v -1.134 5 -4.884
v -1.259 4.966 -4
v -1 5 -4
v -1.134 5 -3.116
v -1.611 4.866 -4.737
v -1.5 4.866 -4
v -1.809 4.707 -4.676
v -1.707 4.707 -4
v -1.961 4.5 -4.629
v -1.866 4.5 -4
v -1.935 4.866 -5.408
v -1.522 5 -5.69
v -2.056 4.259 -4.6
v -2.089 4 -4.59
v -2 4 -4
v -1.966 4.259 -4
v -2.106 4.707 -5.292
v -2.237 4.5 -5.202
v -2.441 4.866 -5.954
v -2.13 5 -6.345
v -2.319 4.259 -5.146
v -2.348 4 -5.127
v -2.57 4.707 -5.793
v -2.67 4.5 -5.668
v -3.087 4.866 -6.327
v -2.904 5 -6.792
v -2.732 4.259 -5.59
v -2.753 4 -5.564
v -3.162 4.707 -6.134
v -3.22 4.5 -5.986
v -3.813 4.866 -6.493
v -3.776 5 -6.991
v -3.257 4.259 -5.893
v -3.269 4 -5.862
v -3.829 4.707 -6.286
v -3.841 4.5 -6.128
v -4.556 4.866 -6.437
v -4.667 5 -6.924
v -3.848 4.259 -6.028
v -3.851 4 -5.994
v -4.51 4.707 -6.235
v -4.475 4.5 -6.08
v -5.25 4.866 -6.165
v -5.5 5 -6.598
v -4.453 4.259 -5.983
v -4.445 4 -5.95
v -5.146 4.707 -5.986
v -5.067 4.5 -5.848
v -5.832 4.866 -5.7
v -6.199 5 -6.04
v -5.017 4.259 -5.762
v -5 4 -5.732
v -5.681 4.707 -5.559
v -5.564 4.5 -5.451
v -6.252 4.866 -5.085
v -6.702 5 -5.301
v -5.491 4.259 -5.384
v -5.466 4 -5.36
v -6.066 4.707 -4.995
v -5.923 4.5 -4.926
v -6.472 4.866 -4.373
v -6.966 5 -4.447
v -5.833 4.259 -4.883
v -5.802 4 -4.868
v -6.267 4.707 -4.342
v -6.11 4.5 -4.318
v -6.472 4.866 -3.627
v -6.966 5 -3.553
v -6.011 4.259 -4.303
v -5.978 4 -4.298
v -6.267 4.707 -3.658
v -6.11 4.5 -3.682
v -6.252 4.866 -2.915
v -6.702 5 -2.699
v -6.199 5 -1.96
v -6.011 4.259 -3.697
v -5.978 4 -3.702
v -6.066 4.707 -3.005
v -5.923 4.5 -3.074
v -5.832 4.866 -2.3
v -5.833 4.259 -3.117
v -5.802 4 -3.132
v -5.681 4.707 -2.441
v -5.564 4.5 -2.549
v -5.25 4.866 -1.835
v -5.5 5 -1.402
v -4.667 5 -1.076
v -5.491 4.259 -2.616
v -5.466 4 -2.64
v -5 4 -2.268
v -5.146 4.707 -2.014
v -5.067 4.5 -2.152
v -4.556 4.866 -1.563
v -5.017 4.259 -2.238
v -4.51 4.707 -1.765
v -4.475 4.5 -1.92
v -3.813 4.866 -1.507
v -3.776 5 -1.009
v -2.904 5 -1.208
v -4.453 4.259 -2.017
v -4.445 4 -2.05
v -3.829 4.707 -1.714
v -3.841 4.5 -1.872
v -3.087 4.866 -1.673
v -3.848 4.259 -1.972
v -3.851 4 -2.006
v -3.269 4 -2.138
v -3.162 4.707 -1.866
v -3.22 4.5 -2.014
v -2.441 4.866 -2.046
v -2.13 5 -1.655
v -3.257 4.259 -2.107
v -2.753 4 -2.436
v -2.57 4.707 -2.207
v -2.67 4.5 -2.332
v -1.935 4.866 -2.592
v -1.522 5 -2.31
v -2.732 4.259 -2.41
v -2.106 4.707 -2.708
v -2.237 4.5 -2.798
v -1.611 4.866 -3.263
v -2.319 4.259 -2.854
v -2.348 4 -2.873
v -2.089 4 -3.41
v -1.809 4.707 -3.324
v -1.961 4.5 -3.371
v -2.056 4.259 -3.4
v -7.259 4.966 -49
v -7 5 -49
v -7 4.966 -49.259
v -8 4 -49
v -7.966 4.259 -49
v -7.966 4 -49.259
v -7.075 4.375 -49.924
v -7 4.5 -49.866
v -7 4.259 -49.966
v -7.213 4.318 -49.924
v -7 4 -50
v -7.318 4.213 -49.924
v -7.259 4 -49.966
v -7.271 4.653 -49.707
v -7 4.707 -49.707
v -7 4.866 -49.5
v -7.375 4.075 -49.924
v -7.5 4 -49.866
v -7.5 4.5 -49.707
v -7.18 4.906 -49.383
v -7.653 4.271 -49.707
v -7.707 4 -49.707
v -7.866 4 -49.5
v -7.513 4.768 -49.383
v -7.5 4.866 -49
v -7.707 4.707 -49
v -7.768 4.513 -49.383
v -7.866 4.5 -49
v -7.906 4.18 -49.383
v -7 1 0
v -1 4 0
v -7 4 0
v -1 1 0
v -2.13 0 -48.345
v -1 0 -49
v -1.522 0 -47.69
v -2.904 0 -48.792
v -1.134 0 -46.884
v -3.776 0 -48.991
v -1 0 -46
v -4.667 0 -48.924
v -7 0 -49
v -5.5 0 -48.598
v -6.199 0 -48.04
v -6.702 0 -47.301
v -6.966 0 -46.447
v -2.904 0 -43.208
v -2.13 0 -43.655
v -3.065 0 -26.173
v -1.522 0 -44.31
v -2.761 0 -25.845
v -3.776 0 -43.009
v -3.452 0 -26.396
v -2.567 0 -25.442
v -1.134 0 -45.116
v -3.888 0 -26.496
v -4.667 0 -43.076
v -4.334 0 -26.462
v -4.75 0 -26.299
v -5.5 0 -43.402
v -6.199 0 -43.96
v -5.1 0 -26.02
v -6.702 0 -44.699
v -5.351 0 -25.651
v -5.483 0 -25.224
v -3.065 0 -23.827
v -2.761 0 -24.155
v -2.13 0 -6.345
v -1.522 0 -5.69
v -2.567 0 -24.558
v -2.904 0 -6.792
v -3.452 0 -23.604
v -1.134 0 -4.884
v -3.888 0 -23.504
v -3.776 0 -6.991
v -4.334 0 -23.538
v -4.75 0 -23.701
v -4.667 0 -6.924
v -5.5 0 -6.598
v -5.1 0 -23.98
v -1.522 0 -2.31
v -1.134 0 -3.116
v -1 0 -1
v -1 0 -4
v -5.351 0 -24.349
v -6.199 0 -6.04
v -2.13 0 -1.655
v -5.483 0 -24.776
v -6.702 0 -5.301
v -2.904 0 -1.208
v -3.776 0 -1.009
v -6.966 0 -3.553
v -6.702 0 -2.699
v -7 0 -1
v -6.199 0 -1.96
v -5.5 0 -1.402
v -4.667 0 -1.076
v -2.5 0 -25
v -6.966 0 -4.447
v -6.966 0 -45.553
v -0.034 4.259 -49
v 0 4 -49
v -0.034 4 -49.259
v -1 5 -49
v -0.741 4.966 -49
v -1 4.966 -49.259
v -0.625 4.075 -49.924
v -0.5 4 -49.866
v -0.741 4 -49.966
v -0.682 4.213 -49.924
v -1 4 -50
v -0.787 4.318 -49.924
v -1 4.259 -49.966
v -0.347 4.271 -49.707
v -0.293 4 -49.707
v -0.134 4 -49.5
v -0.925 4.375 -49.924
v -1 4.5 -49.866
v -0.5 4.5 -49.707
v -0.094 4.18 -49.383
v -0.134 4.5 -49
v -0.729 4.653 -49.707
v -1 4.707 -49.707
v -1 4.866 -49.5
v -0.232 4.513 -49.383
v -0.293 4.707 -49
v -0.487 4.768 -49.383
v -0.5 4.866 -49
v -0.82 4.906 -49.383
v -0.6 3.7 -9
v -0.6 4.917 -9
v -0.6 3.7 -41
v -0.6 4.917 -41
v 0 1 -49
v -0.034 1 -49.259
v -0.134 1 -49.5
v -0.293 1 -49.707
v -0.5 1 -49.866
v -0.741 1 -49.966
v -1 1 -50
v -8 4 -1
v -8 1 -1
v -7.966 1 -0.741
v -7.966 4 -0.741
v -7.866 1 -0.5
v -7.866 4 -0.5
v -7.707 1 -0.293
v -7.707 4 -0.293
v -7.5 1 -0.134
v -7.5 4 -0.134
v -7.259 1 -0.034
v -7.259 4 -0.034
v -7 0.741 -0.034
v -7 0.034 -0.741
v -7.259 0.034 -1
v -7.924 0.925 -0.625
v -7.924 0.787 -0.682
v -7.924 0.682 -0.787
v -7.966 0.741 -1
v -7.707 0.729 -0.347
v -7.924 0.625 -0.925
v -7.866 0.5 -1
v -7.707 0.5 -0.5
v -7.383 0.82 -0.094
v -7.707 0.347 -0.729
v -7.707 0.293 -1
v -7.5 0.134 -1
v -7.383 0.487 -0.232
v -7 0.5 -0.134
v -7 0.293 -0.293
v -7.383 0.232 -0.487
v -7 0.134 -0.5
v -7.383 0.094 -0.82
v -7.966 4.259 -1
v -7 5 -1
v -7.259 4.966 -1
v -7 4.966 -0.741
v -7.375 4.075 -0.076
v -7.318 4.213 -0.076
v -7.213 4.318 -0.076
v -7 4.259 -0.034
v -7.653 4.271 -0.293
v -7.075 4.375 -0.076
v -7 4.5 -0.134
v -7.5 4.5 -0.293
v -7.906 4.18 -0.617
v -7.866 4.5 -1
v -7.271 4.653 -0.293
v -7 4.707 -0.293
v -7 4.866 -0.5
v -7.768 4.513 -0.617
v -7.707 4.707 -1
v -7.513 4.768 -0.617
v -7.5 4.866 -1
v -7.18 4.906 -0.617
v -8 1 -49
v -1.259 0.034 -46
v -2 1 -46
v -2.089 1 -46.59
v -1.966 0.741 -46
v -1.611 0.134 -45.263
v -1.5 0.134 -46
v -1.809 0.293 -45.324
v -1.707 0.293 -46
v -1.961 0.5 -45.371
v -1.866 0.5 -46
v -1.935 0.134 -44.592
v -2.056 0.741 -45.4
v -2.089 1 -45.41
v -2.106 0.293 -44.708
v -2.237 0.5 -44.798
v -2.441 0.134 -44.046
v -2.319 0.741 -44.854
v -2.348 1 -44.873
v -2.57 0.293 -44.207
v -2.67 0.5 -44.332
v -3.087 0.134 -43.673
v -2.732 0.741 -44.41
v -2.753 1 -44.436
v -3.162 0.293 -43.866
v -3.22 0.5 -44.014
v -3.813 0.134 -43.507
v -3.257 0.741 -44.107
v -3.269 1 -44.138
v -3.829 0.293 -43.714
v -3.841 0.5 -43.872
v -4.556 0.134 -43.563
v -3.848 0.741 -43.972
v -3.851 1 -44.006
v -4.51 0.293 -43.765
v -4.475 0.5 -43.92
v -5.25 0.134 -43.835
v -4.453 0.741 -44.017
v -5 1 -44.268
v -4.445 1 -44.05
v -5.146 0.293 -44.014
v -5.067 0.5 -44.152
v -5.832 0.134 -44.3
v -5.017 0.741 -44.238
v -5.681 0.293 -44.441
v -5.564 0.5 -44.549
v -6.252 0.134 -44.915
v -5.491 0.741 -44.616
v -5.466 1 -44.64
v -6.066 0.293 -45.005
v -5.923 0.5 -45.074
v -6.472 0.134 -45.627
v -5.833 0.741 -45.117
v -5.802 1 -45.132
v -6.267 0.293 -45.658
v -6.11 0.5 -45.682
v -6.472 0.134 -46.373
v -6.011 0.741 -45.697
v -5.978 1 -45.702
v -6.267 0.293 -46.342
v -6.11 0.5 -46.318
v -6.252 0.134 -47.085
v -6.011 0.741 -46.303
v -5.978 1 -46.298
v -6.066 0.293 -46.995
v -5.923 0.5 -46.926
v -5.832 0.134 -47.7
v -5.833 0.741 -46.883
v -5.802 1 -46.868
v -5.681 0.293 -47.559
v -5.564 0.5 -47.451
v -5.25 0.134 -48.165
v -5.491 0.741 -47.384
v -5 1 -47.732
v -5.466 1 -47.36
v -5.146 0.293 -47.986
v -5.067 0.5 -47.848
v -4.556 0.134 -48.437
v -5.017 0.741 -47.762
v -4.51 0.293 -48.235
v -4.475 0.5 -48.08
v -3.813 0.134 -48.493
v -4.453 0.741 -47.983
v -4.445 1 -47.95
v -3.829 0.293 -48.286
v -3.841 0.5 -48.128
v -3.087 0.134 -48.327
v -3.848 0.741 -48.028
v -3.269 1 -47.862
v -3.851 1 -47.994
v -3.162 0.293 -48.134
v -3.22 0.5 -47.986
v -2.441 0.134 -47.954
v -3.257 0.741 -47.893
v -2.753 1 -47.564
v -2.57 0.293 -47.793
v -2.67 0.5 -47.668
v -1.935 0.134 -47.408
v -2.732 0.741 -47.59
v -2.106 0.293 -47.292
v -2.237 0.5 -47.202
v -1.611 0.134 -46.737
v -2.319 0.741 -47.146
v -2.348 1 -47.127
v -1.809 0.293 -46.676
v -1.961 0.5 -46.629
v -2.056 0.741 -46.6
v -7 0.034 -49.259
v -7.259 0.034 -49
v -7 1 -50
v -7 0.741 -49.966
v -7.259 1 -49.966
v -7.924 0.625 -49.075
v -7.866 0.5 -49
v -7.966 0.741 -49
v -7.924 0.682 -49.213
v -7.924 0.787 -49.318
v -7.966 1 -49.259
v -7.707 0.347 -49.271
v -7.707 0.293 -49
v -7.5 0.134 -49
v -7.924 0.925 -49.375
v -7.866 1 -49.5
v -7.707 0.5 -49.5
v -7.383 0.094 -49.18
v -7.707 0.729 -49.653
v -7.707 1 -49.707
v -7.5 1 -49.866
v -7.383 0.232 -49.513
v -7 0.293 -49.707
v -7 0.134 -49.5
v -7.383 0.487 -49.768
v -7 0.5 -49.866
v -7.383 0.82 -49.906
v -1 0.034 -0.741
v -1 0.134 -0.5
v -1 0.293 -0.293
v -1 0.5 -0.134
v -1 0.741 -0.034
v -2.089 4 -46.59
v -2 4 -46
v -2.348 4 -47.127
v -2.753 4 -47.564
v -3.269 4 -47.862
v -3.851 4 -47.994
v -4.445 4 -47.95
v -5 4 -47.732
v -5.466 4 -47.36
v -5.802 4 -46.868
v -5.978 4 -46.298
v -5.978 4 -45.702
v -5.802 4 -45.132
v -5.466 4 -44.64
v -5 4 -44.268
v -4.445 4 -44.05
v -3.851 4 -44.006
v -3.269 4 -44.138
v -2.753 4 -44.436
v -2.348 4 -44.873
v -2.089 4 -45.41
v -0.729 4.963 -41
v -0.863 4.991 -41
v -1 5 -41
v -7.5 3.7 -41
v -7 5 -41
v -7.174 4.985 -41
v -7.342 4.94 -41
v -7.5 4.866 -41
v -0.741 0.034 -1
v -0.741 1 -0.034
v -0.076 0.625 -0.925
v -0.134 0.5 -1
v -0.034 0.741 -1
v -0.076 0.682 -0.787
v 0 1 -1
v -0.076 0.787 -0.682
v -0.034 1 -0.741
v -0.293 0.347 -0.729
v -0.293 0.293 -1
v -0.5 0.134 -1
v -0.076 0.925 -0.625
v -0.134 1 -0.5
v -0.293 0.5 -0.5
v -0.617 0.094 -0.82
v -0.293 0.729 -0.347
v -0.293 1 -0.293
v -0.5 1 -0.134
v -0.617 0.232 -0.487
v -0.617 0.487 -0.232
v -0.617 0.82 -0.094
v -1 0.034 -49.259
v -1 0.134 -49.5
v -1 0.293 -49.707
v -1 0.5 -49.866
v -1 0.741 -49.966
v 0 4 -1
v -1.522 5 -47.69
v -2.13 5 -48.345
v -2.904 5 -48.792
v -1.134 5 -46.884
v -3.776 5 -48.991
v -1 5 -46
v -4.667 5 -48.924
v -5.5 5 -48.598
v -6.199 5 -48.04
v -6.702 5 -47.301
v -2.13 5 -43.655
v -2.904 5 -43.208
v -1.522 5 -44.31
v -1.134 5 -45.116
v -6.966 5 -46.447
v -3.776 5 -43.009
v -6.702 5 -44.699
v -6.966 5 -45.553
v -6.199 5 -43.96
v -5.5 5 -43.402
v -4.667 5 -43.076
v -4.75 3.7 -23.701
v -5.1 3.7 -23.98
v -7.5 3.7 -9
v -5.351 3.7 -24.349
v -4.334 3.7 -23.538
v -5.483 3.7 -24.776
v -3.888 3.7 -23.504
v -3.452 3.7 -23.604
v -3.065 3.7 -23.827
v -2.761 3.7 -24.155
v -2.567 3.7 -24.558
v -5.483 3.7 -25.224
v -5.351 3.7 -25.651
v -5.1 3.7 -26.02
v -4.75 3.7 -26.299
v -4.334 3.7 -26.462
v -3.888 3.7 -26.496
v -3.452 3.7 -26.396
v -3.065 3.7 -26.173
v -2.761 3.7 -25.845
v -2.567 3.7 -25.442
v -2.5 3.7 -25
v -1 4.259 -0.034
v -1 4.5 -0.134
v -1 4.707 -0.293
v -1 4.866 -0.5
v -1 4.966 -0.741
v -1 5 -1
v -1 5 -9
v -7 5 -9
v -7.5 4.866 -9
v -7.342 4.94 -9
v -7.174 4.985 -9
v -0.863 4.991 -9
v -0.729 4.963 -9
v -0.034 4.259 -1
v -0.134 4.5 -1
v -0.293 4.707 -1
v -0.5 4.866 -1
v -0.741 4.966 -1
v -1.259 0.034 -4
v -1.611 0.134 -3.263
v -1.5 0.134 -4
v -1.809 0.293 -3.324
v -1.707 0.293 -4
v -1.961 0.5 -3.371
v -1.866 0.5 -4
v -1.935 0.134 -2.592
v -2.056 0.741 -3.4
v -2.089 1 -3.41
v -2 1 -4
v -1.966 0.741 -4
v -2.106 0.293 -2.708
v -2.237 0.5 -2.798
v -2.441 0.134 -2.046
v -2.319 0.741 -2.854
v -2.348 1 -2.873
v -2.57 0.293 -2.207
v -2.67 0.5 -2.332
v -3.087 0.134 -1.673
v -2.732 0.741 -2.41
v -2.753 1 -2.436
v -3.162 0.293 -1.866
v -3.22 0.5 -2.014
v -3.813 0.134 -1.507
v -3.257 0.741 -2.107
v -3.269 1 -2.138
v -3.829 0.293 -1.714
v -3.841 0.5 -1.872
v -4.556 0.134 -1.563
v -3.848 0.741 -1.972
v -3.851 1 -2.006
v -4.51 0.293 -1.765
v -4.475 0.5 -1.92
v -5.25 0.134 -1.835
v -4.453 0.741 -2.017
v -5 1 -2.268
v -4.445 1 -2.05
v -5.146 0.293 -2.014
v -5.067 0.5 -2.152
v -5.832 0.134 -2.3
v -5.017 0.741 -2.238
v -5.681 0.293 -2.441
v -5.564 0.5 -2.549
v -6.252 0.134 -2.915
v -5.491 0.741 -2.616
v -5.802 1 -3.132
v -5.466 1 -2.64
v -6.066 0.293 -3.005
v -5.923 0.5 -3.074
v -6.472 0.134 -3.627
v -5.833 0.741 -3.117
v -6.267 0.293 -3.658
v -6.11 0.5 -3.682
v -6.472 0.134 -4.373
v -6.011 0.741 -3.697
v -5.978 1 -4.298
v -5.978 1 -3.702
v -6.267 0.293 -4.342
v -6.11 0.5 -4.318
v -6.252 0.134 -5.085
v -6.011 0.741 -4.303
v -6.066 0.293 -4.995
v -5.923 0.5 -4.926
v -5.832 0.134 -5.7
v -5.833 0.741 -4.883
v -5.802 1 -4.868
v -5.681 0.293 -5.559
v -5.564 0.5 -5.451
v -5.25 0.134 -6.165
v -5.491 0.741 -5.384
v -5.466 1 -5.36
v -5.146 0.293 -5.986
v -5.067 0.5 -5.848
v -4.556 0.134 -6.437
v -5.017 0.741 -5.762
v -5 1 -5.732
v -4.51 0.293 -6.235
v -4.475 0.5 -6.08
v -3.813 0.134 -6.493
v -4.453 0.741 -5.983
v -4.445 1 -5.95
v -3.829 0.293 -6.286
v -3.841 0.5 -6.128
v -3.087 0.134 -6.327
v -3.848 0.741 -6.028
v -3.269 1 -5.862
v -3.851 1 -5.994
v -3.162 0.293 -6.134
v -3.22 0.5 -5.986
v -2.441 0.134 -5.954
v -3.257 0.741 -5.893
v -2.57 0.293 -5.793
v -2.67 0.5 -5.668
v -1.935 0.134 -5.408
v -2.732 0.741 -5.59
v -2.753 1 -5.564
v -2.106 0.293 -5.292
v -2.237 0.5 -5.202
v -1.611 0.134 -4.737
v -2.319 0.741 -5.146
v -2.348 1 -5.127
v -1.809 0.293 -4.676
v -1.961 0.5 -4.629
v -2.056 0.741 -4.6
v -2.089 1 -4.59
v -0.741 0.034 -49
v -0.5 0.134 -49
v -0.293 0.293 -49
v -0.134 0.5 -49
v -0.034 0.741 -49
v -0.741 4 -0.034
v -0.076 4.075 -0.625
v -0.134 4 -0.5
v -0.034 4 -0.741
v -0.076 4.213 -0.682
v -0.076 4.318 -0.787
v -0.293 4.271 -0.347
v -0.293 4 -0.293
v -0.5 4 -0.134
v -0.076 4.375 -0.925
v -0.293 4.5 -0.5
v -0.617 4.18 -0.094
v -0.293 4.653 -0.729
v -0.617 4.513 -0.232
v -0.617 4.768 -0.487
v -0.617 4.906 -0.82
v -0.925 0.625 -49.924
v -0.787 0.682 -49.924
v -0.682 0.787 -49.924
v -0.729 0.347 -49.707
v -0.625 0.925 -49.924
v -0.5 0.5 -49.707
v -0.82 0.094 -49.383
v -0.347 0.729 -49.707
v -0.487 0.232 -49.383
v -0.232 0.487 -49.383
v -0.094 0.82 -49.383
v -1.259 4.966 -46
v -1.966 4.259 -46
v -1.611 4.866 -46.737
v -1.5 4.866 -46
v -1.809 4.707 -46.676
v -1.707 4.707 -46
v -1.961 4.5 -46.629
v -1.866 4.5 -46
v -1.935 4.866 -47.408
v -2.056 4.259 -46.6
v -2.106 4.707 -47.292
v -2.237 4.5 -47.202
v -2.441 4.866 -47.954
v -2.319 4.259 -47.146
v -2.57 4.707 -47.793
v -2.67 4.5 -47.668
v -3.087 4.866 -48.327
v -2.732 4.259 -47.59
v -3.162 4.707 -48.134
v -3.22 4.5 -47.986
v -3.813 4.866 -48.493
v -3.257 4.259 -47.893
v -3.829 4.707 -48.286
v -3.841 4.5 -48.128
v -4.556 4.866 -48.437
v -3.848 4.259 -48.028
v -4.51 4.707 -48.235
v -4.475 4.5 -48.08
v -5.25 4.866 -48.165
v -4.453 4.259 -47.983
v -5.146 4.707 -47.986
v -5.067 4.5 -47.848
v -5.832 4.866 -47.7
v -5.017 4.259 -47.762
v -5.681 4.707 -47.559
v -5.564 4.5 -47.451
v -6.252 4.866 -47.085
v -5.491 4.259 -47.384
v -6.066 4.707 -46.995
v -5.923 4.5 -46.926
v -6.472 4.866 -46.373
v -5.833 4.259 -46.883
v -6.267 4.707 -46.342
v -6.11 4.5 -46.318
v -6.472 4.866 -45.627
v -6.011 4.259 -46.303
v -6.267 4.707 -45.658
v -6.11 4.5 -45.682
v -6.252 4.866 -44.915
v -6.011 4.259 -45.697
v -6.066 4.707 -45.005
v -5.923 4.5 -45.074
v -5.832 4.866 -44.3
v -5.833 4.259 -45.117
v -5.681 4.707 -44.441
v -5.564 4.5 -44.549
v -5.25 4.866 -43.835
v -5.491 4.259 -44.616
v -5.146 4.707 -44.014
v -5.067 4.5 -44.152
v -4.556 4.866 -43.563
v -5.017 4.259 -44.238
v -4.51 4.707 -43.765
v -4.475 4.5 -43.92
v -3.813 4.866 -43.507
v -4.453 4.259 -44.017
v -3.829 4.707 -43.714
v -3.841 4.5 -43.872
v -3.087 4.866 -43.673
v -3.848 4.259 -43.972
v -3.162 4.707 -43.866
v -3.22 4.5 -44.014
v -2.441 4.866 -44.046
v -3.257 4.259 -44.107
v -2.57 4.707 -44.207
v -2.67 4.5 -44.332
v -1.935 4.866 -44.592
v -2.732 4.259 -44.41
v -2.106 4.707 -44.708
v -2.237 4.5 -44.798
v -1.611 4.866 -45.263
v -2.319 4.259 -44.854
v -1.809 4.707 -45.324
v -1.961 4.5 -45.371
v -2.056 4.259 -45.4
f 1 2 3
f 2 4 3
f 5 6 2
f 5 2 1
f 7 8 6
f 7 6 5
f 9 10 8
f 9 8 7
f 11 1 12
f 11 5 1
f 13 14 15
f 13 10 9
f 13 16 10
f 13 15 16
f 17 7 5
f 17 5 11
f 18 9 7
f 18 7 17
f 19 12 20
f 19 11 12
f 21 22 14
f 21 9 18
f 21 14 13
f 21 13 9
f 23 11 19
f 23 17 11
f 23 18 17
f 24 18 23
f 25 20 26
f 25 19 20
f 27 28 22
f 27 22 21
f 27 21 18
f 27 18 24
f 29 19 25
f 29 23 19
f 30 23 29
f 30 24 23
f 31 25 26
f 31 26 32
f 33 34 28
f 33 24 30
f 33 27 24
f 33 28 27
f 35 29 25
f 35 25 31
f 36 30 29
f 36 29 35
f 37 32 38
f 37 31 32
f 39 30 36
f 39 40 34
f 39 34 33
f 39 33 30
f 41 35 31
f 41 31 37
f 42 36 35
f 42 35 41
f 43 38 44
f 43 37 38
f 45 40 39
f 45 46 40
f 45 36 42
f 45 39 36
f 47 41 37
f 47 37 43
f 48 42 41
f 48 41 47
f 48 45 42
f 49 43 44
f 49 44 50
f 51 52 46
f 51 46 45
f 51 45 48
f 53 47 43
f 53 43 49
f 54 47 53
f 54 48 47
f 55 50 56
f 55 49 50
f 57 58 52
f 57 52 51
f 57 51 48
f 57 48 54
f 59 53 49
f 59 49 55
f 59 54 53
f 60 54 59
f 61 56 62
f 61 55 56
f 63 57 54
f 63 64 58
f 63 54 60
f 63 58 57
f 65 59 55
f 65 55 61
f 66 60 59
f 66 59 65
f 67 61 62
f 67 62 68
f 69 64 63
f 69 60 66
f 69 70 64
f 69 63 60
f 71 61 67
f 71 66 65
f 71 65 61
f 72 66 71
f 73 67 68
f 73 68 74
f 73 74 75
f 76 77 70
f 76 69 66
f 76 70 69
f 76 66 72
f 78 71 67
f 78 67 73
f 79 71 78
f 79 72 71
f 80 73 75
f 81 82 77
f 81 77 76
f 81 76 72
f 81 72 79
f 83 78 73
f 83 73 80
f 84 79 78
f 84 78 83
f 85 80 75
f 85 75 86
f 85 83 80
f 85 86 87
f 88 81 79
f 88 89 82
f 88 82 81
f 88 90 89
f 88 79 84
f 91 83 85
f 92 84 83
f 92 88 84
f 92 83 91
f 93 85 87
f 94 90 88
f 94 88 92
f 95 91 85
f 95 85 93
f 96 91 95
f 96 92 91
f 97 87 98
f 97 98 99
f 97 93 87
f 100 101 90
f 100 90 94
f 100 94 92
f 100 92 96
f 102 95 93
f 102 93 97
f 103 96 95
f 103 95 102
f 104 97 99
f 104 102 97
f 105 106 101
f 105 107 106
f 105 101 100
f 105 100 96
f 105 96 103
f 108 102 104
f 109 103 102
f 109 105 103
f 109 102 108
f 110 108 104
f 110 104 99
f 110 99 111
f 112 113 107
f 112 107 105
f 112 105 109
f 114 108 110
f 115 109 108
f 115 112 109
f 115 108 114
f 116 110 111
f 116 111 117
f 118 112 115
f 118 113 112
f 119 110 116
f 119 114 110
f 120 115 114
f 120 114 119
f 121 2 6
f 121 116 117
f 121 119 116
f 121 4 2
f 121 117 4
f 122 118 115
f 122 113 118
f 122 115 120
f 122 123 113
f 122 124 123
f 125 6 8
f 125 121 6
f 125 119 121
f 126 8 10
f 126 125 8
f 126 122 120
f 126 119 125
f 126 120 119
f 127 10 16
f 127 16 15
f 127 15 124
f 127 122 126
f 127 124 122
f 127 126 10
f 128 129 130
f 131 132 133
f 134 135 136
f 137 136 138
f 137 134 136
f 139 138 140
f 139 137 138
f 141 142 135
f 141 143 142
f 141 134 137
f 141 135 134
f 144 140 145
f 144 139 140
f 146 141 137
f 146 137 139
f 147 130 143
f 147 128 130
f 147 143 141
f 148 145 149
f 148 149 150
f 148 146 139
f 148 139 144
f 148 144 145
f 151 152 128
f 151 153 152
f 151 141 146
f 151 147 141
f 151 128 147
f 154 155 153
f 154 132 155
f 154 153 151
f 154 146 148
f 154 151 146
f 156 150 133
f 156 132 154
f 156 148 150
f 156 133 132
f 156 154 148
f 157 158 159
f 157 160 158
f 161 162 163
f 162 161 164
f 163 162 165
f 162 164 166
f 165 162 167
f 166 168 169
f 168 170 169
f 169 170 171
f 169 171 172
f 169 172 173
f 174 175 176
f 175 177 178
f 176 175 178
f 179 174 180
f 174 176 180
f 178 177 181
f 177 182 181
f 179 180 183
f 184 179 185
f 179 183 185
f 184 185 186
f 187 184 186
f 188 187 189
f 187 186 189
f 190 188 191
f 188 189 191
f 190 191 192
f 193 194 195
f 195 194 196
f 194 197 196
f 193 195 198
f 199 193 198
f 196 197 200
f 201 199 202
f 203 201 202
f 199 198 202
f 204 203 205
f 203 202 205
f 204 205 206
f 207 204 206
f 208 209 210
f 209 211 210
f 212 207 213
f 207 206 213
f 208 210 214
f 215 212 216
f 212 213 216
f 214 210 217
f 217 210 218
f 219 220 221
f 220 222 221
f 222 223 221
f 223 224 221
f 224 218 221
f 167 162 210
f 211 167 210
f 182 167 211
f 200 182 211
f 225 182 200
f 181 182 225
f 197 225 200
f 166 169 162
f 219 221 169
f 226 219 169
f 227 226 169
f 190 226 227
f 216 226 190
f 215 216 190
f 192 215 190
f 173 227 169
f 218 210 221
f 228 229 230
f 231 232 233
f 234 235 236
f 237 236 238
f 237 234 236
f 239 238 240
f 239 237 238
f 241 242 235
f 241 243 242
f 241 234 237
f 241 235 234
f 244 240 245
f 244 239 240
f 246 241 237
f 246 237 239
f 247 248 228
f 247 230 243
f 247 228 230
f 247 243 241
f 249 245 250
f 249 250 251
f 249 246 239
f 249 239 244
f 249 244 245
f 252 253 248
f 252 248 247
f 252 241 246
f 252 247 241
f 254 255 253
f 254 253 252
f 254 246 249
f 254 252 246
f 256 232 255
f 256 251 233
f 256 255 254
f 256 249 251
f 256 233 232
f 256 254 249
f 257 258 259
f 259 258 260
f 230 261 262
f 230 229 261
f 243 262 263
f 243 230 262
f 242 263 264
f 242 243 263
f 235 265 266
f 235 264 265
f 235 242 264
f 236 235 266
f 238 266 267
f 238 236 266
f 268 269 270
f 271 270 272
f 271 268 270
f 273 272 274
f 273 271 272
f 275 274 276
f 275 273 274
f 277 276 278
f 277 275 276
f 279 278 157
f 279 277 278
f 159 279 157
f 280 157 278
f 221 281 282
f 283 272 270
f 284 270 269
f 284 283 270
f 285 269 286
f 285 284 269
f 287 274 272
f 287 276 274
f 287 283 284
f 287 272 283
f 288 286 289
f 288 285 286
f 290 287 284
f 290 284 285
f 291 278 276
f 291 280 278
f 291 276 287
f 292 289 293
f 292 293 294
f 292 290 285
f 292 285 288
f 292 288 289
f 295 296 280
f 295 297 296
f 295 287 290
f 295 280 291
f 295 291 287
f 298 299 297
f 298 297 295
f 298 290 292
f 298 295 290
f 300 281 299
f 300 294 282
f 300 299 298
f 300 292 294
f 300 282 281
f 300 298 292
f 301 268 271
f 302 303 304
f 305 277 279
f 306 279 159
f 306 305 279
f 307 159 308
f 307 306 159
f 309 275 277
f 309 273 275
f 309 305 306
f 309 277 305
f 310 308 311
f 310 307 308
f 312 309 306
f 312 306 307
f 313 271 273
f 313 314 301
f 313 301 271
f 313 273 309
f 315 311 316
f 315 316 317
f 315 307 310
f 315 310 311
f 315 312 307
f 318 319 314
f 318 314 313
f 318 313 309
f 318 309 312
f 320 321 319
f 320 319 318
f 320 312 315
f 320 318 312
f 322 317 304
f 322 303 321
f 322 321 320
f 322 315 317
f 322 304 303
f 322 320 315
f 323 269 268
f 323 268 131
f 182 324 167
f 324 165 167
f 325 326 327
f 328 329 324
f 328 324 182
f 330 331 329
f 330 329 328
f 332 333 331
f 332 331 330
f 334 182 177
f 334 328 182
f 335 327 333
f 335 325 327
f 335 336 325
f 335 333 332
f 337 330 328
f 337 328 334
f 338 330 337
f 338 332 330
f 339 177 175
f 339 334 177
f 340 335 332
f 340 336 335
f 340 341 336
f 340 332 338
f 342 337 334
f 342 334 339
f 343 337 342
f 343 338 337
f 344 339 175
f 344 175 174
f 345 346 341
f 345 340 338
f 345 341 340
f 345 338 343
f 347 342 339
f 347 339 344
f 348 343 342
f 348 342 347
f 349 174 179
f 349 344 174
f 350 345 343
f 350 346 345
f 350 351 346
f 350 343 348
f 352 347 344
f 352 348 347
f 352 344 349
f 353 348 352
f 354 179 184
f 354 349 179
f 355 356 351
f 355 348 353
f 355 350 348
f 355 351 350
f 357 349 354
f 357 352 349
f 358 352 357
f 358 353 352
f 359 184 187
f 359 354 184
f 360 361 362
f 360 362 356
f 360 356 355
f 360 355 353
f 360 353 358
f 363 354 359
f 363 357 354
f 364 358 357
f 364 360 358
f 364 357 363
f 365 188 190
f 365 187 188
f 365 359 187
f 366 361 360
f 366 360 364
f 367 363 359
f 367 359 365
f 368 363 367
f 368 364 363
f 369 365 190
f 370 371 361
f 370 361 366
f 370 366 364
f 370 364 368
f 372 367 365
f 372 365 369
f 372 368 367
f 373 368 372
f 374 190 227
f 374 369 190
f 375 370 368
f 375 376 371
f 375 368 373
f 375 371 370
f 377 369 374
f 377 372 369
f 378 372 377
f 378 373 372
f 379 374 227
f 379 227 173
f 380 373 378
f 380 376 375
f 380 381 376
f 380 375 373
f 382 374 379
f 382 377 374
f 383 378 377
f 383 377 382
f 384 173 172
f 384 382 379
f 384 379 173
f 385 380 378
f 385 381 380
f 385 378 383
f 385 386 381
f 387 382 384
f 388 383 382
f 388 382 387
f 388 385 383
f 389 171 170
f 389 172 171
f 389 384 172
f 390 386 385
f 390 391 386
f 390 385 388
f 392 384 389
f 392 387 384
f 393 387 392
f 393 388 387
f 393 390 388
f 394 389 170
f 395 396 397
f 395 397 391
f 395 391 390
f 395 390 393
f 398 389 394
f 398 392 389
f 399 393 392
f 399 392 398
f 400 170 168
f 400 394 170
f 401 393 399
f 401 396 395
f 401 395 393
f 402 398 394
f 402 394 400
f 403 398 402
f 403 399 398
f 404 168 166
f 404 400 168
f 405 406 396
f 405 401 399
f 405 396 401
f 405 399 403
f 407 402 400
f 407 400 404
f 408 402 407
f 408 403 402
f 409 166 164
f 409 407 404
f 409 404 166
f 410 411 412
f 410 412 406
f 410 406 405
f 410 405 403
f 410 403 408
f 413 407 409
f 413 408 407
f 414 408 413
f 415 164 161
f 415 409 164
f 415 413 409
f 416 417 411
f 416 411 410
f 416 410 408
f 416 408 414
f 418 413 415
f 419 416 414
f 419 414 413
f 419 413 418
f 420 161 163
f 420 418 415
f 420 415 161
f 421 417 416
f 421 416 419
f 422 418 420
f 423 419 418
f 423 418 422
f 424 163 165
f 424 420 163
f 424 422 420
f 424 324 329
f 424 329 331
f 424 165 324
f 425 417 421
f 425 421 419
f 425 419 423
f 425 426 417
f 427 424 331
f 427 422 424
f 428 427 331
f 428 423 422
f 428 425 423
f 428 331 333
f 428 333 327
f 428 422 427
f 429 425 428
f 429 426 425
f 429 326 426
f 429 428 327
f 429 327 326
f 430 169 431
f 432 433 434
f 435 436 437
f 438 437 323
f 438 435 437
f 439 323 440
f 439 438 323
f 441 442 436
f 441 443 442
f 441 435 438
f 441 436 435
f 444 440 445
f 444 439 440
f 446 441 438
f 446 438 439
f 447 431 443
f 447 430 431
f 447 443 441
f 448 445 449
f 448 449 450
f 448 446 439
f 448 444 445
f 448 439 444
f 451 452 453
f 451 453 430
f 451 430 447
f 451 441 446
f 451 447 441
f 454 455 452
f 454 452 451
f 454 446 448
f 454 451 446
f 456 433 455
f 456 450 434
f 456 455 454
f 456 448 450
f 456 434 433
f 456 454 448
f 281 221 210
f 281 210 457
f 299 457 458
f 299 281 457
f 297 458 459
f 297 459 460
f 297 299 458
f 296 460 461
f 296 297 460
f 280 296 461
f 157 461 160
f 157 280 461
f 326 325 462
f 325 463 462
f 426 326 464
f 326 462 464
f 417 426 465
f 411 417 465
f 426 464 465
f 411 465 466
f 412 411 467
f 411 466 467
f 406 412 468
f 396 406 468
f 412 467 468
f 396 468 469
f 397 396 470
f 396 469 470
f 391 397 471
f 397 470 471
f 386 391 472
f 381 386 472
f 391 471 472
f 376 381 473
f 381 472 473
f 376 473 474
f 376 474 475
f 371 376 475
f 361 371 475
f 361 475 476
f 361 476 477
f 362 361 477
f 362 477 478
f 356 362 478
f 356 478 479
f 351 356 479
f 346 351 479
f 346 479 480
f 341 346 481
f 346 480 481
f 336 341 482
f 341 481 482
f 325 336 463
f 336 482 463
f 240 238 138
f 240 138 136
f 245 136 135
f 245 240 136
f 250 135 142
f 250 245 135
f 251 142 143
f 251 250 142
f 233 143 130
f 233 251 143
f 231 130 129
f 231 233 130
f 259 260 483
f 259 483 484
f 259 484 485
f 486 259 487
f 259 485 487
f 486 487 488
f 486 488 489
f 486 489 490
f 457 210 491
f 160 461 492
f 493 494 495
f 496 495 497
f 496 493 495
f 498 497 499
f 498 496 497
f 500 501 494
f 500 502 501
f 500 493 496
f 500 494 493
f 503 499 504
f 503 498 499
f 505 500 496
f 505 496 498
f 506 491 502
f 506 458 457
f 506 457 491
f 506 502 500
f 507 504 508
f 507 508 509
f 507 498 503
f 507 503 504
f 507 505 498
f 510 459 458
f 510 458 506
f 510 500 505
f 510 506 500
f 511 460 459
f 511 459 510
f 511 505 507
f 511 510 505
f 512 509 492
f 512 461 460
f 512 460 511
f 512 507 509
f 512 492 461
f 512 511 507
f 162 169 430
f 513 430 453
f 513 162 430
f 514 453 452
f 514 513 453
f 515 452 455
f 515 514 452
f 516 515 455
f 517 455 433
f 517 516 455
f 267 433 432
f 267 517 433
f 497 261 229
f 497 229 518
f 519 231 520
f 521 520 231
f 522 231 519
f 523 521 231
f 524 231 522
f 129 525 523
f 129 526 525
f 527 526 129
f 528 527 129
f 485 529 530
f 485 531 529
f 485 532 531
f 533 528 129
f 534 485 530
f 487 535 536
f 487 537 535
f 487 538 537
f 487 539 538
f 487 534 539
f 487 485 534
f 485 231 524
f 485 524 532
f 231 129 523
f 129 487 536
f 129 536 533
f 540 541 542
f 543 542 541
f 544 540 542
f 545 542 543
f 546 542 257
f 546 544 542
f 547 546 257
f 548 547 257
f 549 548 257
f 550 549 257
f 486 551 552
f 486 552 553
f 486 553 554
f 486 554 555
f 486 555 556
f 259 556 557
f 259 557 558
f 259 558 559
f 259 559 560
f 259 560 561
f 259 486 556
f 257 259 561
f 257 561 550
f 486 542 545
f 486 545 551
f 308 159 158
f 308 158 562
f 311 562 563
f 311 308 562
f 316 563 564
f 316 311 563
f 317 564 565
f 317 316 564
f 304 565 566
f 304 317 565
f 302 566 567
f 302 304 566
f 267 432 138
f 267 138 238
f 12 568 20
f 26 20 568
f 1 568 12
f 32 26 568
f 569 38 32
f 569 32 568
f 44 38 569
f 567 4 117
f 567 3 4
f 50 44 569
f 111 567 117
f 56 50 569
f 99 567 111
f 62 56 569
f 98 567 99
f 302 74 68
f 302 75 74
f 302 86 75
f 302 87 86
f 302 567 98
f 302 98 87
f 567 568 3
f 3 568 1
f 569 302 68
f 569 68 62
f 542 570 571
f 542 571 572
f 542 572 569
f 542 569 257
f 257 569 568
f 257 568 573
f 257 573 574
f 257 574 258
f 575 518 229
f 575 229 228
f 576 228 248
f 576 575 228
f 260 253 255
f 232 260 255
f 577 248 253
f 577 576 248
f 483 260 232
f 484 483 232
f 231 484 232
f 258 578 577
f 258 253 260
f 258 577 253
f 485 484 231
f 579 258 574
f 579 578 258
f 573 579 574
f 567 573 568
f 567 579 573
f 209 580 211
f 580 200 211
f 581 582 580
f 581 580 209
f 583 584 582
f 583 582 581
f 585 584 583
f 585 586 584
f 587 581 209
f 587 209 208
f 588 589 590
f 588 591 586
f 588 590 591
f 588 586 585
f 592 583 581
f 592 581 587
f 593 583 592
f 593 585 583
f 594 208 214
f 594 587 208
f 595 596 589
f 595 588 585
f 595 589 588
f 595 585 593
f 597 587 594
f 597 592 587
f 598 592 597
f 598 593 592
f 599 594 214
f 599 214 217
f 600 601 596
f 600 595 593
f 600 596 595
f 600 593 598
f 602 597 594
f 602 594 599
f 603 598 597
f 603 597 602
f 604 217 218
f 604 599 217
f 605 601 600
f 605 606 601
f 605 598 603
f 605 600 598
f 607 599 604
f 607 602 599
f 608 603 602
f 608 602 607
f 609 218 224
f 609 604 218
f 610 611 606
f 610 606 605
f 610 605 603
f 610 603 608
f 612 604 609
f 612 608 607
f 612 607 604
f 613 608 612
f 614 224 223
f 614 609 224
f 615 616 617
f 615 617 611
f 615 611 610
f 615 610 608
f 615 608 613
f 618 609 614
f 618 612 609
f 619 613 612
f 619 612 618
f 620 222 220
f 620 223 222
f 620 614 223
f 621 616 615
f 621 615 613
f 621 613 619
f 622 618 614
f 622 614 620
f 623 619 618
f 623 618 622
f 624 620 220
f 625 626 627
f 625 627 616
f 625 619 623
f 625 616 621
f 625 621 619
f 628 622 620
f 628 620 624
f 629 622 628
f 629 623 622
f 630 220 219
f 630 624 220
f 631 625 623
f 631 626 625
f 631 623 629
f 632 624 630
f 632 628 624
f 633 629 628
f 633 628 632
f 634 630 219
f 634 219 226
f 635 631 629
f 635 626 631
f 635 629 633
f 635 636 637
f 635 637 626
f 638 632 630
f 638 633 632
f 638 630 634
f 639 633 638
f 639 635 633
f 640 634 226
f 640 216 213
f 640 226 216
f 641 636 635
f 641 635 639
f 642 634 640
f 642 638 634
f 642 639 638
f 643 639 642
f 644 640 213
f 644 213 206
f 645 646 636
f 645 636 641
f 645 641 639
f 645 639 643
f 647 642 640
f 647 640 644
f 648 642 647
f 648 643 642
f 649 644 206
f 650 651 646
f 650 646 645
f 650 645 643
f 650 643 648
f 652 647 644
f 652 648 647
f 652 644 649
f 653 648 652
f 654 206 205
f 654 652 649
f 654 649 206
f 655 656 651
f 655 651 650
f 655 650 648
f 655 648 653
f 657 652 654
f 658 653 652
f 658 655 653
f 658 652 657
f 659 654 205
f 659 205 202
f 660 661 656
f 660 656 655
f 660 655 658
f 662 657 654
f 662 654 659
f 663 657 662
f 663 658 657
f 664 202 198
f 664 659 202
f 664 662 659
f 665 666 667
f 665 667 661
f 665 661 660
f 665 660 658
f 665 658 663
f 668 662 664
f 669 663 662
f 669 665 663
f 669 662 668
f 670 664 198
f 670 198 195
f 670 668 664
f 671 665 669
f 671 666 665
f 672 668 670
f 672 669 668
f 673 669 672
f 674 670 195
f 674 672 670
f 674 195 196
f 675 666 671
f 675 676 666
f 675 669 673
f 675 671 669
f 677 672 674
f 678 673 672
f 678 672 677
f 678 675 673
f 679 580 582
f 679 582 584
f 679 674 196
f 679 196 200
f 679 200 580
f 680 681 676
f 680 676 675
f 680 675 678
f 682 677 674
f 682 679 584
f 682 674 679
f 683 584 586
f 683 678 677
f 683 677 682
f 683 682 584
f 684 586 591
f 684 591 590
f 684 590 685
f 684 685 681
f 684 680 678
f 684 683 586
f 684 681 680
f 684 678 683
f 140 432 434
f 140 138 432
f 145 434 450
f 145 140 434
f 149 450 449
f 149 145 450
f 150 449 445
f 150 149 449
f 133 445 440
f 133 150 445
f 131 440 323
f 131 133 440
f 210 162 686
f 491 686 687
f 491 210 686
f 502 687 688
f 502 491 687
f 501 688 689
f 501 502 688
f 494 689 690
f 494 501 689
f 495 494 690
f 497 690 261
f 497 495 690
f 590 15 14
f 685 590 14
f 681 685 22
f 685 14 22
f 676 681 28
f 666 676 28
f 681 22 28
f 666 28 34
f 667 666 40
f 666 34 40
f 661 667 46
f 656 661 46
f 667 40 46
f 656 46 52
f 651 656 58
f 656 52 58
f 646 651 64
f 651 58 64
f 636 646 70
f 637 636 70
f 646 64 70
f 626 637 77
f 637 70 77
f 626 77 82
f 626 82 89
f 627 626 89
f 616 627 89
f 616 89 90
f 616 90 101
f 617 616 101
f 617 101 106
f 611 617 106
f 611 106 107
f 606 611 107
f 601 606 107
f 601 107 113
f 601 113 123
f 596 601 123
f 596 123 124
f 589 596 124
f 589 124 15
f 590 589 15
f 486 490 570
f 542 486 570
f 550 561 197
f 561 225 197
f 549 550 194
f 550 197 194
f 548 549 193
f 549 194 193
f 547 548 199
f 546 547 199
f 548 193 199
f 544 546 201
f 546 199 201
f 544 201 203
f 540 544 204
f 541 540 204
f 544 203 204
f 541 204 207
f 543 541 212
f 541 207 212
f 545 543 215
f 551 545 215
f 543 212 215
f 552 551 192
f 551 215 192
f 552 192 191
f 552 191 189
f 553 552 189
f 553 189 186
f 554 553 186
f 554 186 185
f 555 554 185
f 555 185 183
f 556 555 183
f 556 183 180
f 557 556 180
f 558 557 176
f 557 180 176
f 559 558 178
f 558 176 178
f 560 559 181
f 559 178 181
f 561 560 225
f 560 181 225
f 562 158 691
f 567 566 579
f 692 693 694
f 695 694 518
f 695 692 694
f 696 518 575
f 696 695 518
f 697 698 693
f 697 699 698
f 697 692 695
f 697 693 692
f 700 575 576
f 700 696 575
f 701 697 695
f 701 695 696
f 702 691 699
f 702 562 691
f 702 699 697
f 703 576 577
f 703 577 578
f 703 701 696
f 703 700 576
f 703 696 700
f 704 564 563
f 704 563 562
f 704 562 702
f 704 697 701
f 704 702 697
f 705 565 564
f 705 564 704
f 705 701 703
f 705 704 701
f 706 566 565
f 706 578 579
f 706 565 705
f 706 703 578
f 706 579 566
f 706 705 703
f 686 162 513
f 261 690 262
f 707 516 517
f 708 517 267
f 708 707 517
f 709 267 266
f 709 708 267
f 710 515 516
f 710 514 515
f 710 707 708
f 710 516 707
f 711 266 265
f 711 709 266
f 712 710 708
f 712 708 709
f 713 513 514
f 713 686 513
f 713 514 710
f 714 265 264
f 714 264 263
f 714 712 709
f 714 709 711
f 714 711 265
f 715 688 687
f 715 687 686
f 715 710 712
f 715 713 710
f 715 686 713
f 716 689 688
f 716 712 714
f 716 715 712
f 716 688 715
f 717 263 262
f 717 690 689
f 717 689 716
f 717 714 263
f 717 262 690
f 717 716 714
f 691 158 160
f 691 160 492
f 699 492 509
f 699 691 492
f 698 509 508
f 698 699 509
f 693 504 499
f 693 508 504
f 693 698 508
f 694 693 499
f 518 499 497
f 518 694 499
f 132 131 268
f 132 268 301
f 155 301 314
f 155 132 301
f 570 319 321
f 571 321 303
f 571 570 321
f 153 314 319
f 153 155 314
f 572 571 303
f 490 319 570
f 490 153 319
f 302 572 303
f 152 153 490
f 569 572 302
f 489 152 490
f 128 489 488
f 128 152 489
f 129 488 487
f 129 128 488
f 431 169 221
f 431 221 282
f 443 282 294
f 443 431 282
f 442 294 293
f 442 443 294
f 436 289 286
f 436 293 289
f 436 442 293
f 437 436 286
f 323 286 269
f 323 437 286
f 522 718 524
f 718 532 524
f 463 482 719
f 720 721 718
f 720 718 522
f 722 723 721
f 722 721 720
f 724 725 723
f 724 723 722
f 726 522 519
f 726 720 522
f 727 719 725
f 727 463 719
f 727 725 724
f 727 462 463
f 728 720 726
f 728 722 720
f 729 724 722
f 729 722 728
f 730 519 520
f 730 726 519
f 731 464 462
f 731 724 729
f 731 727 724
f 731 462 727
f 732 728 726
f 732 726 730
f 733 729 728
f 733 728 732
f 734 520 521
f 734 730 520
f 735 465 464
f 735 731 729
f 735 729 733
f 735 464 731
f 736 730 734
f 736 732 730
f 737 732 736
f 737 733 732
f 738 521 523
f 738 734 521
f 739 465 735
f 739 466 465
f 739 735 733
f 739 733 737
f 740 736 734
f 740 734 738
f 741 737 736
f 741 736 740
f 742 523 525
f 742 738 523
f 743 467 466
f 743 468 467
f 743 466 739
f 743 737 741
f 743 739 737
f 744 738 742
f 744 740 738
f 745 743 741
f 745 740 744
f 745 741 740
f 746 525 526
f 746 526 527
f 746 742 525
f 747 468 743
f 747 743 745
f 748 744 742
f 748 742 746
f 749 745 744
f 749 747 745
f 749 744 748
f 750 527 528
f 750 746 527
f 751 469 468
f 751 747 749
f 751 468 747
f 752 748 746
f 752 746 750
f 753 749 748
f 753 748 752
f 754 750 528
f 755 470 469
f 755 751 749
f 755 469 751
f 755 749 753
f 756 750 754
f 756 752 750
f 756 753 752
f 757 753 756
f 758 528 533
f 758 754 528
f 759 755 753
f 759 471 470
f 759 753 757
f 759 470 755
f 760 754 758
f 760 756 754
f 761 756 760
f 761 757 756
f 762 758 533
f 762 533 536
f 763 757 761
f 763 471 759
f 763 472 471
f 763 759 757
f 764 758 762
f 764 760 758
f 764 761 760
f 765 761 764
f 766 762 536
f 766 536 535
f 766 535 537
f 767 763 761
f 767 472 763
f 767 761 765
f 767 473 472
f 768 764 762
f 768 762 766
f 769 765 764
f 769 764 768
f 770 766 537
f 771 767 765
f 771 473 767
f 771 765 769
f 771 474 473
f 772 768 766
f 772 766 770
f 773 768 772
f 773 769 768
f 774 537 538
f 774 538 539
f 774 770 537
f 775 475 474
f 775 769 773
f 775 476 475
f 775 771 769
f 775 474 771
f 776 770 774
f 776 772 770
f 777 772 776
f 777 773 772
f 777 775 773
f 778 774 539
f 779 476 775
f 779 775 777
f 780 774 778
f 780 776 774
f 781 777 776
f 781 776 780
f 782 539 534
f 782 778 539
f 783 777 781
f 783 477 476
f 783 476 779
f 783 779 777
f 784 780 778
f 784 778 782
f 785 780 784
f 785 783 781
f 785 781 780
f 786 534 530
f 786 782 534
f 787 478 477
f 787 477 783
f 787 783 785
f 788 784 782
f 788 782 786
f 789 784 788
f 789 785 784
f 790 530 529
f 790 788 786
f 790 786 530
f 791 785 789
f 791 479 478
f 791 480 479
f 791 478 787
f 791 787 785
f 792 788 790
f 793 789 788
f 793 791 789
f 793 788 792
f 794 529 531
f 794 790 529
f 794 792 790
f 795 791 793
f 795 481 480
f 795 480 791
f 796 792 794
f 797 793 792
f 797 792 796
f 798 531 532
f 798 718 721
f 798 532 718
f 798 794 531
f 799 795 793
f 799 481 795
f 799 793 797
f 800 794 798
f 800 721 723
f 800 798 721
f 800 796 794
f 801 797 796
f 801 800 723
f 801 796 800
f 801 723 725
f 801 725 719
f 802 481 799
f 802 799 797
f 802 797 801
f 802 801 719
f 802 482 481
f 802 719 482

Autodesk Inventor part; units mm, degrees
ref_plane "YZ Plane" through (0, 0, 0) normal (1, 0, 0) x (0, 1, 0)
ref_plane "XZ Plane" through (0, 0, 0) normal (0, 1, 0) x (-1, 0, 0)
ref_plane "XY Plane" through (0, 0, 0) normal (0, 0, 1) x (1, 0, 0)
sketch "스케치1" plane through (0, 0, 0) normal (0, 1, 0) x (-1, 0, 0)
  line L0 (0, 0) -> (8, 0)
  line L1 (8, 0) -> (8, -50)
  line L2 (8, -50) -> (0, -50)
  line L3 (0, -50) -> (0, 0)
  dimension "d0" = 50
  dimension "d1" = 8
extrude "돌출1" add sketch "스케치1" along normal blind 5
sketch "스케치2" plane through (0, 5, 0) normal (0, 1, 0) x (1, 0, 0)
  circle A0 centre (-4, 4) radius 2
  line L0 (-8, 50) -> (-8, 0) projected
  line L1 (-8, 0) -> (0, 0) projected
  circle A1 centre (-4, 46) radius 2
  line L2 (0, 0) -> (0, 50) projected
  line L3 (0, 50) -> (-8, 50) projected
  dimension "d4" = 4
  dimension "d5" = 4
  dimension "d6" = 4
  dimension "d7" = 4
  dimension "d8" = 4
  dimension "d9" = 4
sketch "스케치3" plane through (0, 0, 0) normal (0, -1, 0) x (1, 0, 0)
  circle A0 centre (-4, -25) radius 1.5
  line L0 (-8, -50) -> (0, -50) projected
  line L1 (0, -50) -> (0, 0) projected
  dimension "d10" = 3
  dimension "d11" = 25
  dimension "d12" = 4
extrude "돌출2" cut sketch "스케치2" against normal blind 5 contours A0 | A1
extrude "돌출3" cut sketch "스케치3" against normal blind 5
fillet "모깎기1" radius 1 12 edges at (-8, 5, -25) (-4, 5, 0) (0, 5, -25) (-4, 0, 0) (0, 0, -25) (0, 2.5, 0) (-8, 2.5, 0) (0, 2.5, -50) (-4, 5, -50) (-4, 0, -50) (-8, 2.5, -50) (-8, 0, -25)
fillet "모깎기3" radius 1 4 edges at (-6, 0, -46) (-6, 0, -4) (-6, 5, -4) (-6, 5, -46)
sketch "스케치4" plane through (0, 0, 0) normal (0, -1, 0) x (1, 0, 0)
  point P0 (0, 0)
sketch "스케치5" plane through (0, 5, 0) normal (0, 1, 0) x (1, 0, 0)
  line L0 (-7.5, 9) -> (-0.6, 9)
  line L1 (-0.6, 9) -> (-0.6, 41)
  line L2 (-0.6, 41) -> (-7.5, 41)
  line L3 (-7.5, 41) -> (-7.5, 9)
  line L4 (-4, 1) -> (-7, 1) projected
  line L5 (-1, 46) -> (-1, 4) projected
  point P0 (0, 0)
  dimension "d20" = 6.9
  dimension "d21" = 32
  dimension "d22" = 32
  dimension "d23" = 8
  dimension "d24" = 6.5
extrude "돌출4" cut sketch "스케치5" against normal blind 1.3
properties part number "핸들서보"
